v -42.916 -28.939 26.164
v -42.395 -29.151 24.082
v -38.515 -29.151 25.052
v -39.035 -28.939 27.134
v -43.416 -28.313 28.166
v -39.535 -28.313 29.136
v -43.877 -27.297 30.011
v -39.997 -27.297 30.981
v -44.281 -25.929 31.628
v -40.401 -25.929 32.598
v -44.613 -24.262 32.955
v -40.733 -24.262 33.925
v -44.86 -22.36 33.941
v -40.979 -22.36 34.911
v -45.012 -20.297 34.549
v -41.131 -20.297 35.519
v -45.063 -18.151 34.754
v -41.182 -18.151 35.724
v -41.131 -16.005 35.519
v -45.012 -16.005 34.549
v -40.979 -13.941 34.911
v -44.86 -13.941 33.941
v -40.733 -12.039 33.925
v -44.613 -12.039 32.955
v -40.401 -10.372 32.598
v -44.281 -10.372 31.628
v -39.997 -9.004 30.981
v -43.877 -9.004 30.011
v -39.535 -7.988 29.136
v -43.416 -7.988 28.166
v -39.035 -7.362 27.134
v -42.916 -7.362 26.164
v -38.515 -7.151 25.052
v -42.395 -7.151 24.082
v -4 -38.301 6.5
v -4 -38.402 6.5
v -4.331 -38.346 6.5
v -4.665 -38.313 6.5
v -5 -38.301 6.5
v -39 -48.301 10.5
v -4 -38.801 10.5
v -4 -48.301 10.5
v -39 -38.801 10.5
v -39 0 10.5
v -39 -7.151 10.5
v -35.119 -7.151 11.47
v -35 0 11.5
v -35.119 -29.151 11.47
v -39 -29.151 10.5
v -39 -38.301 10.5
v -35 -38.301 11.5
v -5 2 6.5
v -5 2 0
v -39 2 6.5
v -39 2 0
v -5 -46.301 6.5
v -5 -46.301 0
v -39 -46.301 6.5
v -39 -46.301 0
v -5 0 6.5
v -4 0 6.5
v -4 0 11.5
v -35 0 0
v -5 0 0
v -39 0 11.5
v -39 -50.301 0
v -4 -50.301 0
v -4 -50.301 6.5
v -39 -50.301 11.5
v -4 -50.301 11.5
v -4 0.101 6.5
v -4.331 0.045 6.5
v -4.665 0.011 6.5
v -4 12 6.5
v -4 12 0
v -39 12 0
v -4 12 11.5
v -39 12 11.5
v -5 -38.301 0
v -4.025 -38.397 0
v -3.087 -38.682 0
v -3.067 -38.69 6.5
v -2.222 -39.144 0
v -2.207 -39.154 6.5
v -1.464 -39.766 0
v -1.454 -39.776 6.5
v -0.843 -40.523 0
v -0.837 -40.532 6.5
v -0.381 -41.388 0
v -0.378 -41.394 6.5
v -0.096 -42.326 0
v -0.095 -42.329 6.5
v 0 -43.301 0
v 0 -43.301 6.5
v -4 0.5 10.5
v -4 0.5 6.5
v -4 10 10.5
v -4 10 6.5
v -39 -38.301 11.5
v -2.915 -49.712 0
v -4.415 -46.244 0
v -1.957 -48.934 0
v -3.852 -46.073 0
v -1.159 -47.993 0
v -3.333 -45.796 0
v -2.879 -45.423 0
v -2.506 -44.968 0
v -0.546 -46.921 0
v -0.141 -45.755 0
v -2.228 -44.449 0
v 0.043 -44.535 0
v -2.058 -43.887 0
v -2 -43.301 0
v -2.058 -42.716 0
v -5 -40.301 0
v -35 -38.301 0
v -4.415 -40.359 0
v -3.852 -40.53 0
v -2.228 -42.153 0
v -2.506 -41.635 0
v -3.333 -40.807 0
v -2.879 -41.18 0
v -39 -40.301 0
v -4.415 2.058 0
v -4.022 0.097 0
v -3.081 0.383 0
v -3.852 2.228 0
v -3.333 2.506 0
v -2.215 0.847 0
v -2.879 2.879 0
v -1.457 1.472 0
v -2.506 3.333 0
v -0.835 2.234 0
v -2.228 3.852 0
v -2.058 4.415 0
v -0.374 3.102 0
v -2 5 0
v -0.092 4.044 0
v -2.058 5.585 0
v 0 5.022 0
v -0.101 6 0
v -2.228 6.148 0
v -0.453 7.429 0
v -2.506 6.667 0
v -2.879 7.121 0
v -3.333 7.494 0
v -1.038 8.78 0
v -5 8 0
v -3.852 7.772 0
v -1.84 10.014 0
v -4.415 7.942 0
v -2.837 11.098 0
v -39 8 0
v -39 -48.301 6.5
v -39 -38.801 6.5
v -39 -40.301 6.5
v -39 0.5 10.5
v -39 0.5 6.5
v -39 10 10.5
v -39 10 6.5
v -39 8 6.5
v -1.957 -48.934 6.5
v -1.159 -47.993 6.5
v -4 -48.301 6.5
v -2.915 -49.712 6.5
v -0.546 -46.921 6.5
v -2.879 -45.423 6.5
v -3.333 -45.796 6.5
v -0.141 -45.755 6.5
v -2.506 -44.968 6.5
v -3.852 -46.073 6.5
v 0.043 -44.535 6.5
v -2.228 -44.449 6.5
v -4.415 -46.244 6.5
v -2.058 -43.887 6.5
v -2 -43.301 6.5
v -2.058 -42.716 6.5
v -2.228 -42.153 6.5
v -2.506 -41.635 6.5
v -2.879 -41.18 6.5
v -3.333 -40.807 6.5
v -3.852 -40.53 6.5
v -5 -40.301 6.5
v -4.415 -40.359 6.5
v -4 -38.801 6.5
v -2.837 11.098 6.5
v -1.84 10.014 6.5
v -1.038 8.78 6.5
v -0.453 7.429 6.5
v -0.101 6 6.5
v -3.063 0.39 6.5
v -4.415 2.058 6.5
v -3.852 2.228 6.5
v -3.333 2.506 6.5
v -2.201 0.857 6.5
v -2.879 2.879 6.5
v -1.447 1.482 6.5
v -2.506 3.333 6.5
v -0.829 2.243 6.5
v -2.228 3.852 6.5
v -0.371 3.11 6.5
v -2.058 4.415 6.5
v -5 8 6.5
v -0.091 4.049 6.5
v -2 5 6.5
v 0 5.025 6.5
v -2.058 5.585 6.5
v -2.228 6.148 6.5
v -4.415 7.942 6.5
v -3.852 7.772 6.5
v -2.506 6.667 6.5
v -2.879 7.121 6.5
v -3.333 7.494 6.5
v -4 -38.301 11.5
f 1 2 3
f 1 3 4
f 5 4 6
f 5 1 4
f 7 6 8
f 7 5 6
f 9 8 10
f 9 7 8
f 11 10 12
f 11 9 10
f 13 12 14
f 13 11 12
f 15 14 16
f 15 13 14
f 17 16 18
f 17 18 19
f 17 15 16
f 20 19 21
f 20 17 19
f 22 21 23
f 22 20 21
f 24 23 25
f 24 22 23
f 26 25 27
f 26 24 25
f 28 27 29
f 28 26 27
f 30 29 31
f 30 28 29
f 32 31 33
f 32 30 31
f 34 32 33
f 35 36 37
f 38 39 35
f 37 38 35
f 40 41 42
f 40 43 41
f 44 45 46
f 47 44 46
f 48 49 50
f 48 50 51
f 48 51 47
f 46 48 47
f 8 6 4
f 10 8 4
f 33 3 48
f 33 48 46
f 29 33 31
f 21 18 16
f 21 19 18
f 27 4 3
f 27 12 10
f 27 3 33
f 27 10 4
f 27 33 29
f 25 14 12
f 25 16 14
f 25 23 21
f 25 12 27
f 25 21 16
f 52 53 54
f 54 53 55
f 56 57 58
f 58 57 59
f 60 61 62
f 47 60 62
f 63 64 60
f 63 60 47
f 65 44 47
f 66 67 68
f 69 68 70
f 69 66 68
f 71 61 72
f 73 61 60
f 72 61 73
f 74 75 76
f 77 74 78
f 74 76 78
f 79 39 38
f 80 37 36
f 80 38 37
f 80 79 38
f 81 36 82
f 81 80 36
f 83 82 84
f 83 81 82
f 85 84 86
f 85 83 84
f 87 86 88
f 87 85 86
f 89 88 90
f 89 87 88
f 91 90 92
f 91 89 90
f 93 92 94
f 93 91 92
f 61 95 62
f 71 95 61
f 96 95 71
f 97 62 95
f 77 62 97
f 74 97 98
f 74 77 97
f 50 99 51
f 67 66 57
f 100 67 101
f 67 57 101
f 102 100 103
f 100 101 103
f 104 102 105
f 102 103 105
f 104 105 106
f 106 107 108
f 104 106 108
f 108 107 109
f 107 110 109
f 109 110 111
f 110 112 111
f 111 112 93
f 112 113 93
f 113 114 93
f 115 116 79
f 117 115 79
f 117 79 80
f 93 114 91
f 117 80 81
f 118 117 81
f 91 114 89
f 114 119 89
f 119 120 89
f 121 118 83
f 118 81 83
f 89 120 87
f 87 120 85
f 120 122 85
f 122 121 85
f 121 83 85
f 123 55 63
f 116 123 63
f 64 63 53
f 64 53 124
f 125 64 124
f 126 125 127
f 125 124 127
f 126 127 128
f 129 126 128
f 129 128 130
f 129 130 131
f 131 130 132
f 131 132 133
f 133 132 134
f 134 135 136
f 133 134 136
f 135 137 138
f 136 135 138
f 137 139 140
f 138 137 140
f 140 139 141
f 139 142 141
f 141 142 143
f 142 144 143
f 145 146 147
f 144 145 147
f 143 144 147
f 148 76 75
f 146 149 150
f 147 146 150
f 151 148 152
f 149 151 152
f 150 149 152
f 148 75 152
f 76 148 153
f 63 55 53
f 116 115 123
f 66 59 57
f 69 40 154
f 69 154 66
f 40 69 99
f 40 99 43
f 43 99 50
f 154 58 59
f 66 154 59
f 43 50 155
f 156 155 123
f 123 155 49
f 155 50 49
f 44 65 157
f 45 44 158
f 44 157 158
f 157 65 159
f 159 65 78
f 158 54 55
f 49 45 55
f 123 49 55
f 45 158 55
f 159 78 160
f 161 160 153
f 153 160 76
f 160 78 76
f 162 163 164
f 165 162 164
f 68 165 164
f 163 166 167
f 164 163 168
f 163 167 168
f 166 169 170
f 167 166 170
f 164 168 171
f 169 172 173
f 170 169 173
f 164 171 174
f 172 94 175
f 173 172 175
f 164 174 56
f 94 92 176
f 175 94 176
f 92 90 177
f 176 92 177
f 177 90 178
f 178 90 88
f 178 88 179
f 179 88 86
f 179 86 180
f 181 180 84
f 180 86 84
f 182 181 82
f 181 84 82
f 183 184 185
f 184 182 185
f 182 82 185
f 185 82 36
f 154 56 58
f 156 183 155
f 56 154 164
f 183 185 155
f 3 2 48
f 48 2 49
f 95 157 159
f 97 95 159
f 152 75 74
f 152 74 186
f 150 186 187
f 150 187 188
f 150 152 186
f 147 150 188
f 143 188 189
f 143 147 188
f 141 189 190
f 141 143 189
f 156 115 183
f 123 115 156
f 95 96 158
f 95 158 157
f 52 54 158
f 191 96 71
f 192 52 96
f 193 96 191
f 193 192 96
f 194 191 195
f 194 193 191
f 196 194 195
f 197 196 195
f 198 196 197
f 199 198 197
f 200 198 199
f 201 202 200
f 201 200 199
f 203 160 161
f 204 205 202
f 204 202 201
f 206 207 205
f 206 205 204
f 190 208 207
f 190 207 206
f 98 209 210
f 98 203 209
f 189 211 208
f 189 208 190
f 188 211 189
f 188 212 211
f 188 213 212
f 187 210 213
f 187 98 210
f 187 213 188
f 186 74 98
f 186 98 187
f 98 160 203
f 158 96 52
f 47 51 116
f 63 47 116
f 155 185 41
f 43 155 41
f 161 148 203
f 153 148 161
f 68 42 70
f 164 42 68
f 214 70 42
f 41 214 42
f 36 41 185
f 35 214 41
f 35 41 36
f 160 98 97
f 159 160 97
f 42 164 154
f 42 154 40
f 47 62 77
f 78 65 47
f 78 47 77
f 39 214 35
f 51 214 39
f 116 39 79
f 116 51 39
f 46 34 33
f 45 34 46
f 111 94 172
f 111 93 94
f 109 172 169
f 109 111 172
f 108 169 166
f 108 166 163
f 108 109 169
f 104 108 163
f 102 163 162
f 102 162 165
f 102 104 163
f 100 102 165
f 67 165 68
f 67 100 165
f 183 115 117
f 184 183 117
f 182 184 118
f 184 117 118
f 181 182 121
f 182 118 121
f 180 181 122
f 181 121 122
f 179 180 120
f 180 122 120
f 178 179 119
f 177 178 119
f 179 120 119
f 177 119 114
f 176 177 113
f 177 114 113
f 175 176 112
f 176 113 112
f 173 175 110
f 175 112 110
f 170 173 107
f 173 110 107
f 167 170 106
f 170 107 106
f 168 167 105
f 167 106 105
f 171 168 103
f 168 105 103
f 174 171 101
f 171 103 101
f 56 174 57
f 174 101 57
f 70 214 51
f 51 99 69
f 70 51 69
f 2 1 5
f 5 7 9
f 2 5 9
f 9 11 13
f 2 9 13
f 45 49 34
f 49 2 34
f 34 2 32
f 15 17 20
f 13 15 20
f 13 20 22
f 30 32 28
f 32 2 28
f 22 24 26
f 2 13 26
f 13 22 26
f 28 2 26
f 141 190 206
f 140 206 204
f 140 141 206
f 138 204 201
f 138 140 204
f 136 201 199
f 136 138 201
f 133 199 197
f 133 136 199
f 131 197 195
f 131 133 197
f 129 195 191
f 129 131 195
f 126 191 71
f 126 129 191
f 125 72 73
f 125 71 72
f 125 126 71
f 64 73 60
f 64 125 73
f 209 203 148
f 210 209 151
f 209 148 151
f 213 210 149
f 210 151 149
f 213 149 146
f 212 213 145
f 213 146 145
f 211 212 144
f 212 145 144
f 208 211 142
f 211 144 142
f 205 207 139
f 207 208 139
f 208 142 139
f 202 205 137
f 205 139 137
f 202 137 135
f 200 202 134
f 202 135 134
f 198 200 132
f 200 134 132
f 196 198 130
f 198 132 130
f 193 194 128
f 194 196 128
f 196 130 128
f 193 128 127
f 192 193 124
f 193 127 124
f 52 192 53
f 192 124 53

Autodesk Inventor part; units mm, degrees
ref_plane "YZ Plane" through (0, 0, 0) normal (1, 0, 0) x (0, 1, 0)
ref_plane "XZ Plane" through (0, 0, 0) normal (0, 1, 0) x (-1, 0, 0)
ref_plane "XY Plane" through (0, 0, 0) normal (0, 0, 1) x (1, 0, 0)
sketch "Sketch1" plane through (0, 0, 0) normal (0, 0, 1) x (1, 0, 0)
  circle A0 centre (-35, 5) radius 2.5
  circle A1 centre (-35, -43.3013) radius 2.5
  circle A2 centre (-5, -43.3013) radius 2.5
  circle A3 centre (-5, 5) radius 2.5
  circle A4 centre (-5, 5) radius 3
  circle A5 centre (-35, 5) radius 3
  circle A6 centre (-5, -43.3013) radius 3
  circle A7 centre (-5, 5) radius 5
  line L0 (-5, 8) -> (-35, 8)
  line L1 (-5, 2) -> (-35, 2)
  circle A8 centre (-35, -43.3013) radius 5
  circle A9 centre (-5, -43.3013) radius 5
  circle A10 centre (-35, -43.3013) radius 3
  line L2 (-5, -40.3013) -> (-35, -40.3013)
  line L3 (-5, -46.3013) -> (-35, -46.3013)
  circle A11 centre (-35, 5) radius 5
  line L4 (-35, 8) -> (-39, 8)
  line L5 (-35, 2) -> (-39, 2)
  line L6 (-35, -40.3013) -> (-39, -40.3013)
  line L7 (-35, -46.3013) -> (-39, -46.3013)
  line L8 (-5, 10) -> (-35, 10)
  line L9 (-5, 0) -> (-35, 0)
  line L10 (-5, -38.3013) -> (-35, -38.3013)
  line L11 (-5, -48.3013) -> (-35, -48.3013)
  line L12 (-35, 0) -> (-35, -38.3013)
  line L13 (-39, 2) -> (-39, -40.3013)
  point P0 (0, 0)
  dimension "d0" = 6
  dimension "d1" = 6
  dimension "d3" = 6
  dimension "d4" = 10
  dimension "d5" = 10
  dimension "d6" = 6
  dimension "d7" = 10
extrude "Extrusion1" add sketch "Sketch1" along normal blind 6.5 contours A4 L0 A7 L1 | L0 A11 L8 A7 | A7 L9 A11 L1 | L0 L4 A11 | A11 L5 L1 | L12 A8 L13 A11 | A8 L2 L6 | L10 A9 L2 A8 | A9 L3 A6 L2 | L7 L3 A8 | A8 L3 A9 L11 picked at (-7.4012, 8.2796) picked at (-7.4012, -46.5809)
sketch "Sketch2" plane through (-35, -38.3013, 0) normal (1, 0, 0) x (0, 0, -1)
  line L0 (-6.5, 0) -> (-6.5, 38.3013) projected
  line L1 (-6.5, 38.3013) -> (-6.5, 40.3013)
  line L2 (-6.5, 38.3013) -> (-11.5, 38.3013)
  line L3 (-6.5, 38.3013) -> (-1.5, 38.3013) construction
  line L4 (-6.5, 0) -> (-11.5, 0)
  line L5 (-6.5, 40.3013) -> (-6.5, -2) projected
  line L6 (-6.5, 0) -> (-1.5, 0) construction
  line L7 (-11.5, 0) -> (-11.5, 38.3013)
  point P0 (0, 38.3013)
  dimension "d10" = 5
  dimension "d11" = 180
  dimension "d12" = 5
  dimension "d13" = 180
extrude "Extrusion2" add sketch "Sketch2" against normal blind 4
sketch "Sketch3" plane through (-35, -38.3013, 6.5) normal (0, -1, 0) x (1, 0, 0)
  line L0 (0, 5) -> (0, 0) projected
  line L1 (0, 5) -> (-4, 5) projected
  line L2 (-4, 0) -> (-4, 5) projected
  line L3 (0, 0) -> (-4, 0) projected
  line L4 (-4, 5) -> (-4, 4)
  line L5 (-4, 4) -> (0, 5)
  point P0 (35, -6.5)
  dimension "d16" = 1
extrude "Extrusion3" cut sketch "Sketch3" against normal up to surface (38.3013 mm away) contours L5 L2 L1
ref_plane "Work Plane1" through (-39, -18.1506, 10.5) normal (0.9701, 0, 0.2425) x (0, 1, 0)
sketch "Sketch5" plane through (-35, -38.3013, 0) normal (1, 0, 0) x (0, 0, -1)
  line L0 (0, 38.3013) -> (0, 48.3013) projected
  line L1 (0, 48.3013) -> (-6.5, 48.3013) projected
  line L2 (-6.5, 38.3013) -> (-6.5, 48.3013) projected
  line L3 (0, 38.3013) -> (-6.5, 38.3013) projected
  line L4 (0, -10) -> (0, 0) projected
  line L5 (0, 0) -> (-6.5, 0) projected
  line L6 (-6.5, -10) -> (-6.5, 0) projected
  line L7 (0, -10) -> (-6.5, -10) projected
  line L8 (0, 0) -> (0, 38.3013) projected
  line L9 (0, 38.3013) -> (-6.5, 38.3013) projected
  line L10 (-6.5, 38.3013) -> (-11.5, 38.3013) projected
  line L11 (-11.5, 38.3013) -> (-11.5, 0) projected
  line L12 (-11.5, 0) -> (-6.5, 0) projected
  line L13 (0, 0) -> (-6.5, 0) projected
  line L14 (0, 48.3013) -> (0, 50.3013)
  line L15 (0, 50.3013) -> (-17.5997, 50.3013)
  line L16 (0, -10) -> (0, -12)
  line L17 (0, -12) -> (-16.7586, -12)
  line L18 (-11.5, 0) -> (-11.5, -14.3259)
  line L19 (-6.5, 38.3013) -> (-11.5, 38.3013) projected
  line L20 (-11.5, 38.3013) -> (-11.5, 54.2478)
  line L21 (-6.5, 48.3013) -> (-17.5997, 48.3013)
  line L22 (-6.5, -8) -> (-6.5, -10) projected
  line L23 (-6.5, -10) -> (-16.7586, -10)
  line L24 (-6.5, 38.3013) -> (-6.5, 38.8013)
  line L25 (-6.5, 38.8013) -> (-12, 38.8013)
  line L26 (-6.5, 0) -> (-6.5, -2) projected
  line L27 (-6.5, 0) -> (-6.5, -0.5)
  line L28 (-6.5, -0.5) -> (-13.9811, -0.5)
  line L29 (-11.5, 38.3013) -> (-10.5, 38.3013)
  line L30 (-10.5, 38.3013) -> (-10.5, 53.5621)
  line L31 (-11.5, 38.3013) -> (-11.5, 0) projected
  line L32 (-11.5, 0) -> (-10.5, 0)
  line L33 (-10.5, 0) -> (-10.5, -14.7859)
  point P0 (0, 38.3013)
  point P1 (-10.5, -0.5)
  point P2 (-6.5, -0.5)
  point P3 (-11.5, -12)
  point P4 (-10.5, -10)
  point P5 (-11.5, 50.3013)
  point P6 (-10.5, 38.8013)
  point P7 (-10.5, 48.3013)
  dimension "d26" = 2
  dimension "d27" = 2
  dimension "d28" = 0.5
  dimension "d29" = 90
  dimension "d30" = 0.5
  dimension "d31" = 1
extrude "Extrusion5" add sketch "Sketch5" along normal blind 31 and the other way blind 4 contours L1 L21 L30 L15 L14 | L10 L30 L25 L2 | L10 L20 L25 L30 | L16 L17 L33 L23 L7 | L6 L28 L33 L12 | L30 L25 L20 L21 | L21 L20 L15 L30 | L33 L28 L18 L12 | L33 L17 L18 L23 | L23 L18 L28 L33
sketch "Sketch24" plane through (0, 0, 0) normal (0, 0, -1) x (-1, 0, 0)
  line L0 (39, 2) -> (39, -40.3013) projected
  line L1 (5, 2) -> (39, 2) projected
  arc A0 (5, 8) -> (5, 2) centre (5, 5) ccw projected
  line L2 (39, 8) -> (5, 8) projected
  arc A1 (39, 8) -> (35, 10) centre (35, 5) ccw projected
  line L3 (39, 10) -> (35, 10) projected
  line L4 (39, 12) -> (39, 10) projected
  line L5 (4, 12) -> (39, 12) projected
  line L6 (4, 10) -> (4, 12) projected
  line L7 (5, 10) -> (4, 10) projected
  arc A2 (5, 10) -> (5, 0) centre (5, 5) ccw projected
  line L8 (35, 0) -> (5, 0) projected
  line L9 (35, -38.3013) -> (35, 0) projected
  line L10 (5, -38.3013) -> (35, -38.3013) projected
  arc A3 (5, -38.3013) -> (5, -48.3013) centre (5, -43.3013) ccw projected
  line L11 (5, -48.3013) -> (4, -48.3013) projected
  line L12 (4, -50.3013) -> (4, -48.3013) projected
  line L13 (39, -50.3013) -> (4, -50.3013) projected
  line L14 (39, -48.3013) -> (39, -50.3013) projected
  line L15 (39, -48.3013) -> (35, -48.3013) projected
  arc A4 (35, -48.3013) -> (39, -46.3013) centre (35, -43.3013) ccw projected
  line L16 (5, -46.3013) -> (39, -46.3013) projected
  arc A5 (5, -40.3013) -> (5, -46.3013) centre (5, -43.3013) ccw projected
  line L17 (39, -40.3013) -> (5, -40.3013) projected
  line L18 (4, 12) -> (4, 0) projected
  arc A6 (4, 12) -> (0, 5) centre (8.7961, 4.6165) ccw
  arc A7 (0, -43.3013) -> (4, -50.3013) centre (6.6386, -44.1506) ccw
  line L19 (39, 8) -> (39, 12)
  line L20 (39, 0.5) -> (4, 0.5) projected
  line L21 (39, -46.3013) -> (39, -48.3982)
  line L22 (39, -48.3013) -> (39, -50.3013) projected
  point P0 (0, 0)
  point P1 (0.101, 6)
extrude "Extrusion23" add sketch "Sketch24" against normal blind 6.5 contours L18 L7 A2 | A2 A6 L6 L18 | L21 L15 A4 | A1 L3 L19 | A3 L11 L12 A7
sketch "Sketch25" plane through (-39, 2, 0) normal (-1, 0, 0) x (0, 0, 1)
  line L0 (6.5, -50.3013) -> (10.5, -50.3013) projected
  line L1 (10.5, -50.3013) -> (10.5, -40.8013) projected
  line L2 (10.5, -40.8013) -> (6.5, -40.8013) projected
  line L3 (6.5, -40.8013) -> (6.5, -50.3013)
  line L4 (0, -45.3013) -> (10.5, -45.3013) projected
  line L5 (6.5, -42.3013) -> (0, -42.3013) projected
  line L6 (0, 0) -> (0, -42.3013) projected
  point P0 (0, -2)
  point P1 (6.5, -45.3013)
extrude "Extrusion24" cut sketch "Sketch25" against normal blind 23.75
sketch "Sketch35" plane through (-39, -18.1506, 10.5) normal (0.9701, 0, 0.2425) x (0, 1, 0)
  line L0 (-20.1506, 0) -> (18.1506, 0) projected
  line L1 (0, 0) -> (0, 30)
  line L2 (0, 0) -> (30, 0) construction
  circle A0 centre (0, 14) radius 11
  line L3 (11, 14) -> (11, 0)
  line L4 (-11, 14) -> (-11, 0)
  line L5 (0, 25) -> (0, 35)
  point P0 (18.1506, -19.6454)
  point P1 (11, 0)
  dimension "d177" = 30
  dimension "d178" = 90
  dimension "d179" = 22
  dimension "d182" = 10
extrude "Extrusion34" add sketch "Sketch35" along normal blind 4
properties part number "CapTurnerV3"
